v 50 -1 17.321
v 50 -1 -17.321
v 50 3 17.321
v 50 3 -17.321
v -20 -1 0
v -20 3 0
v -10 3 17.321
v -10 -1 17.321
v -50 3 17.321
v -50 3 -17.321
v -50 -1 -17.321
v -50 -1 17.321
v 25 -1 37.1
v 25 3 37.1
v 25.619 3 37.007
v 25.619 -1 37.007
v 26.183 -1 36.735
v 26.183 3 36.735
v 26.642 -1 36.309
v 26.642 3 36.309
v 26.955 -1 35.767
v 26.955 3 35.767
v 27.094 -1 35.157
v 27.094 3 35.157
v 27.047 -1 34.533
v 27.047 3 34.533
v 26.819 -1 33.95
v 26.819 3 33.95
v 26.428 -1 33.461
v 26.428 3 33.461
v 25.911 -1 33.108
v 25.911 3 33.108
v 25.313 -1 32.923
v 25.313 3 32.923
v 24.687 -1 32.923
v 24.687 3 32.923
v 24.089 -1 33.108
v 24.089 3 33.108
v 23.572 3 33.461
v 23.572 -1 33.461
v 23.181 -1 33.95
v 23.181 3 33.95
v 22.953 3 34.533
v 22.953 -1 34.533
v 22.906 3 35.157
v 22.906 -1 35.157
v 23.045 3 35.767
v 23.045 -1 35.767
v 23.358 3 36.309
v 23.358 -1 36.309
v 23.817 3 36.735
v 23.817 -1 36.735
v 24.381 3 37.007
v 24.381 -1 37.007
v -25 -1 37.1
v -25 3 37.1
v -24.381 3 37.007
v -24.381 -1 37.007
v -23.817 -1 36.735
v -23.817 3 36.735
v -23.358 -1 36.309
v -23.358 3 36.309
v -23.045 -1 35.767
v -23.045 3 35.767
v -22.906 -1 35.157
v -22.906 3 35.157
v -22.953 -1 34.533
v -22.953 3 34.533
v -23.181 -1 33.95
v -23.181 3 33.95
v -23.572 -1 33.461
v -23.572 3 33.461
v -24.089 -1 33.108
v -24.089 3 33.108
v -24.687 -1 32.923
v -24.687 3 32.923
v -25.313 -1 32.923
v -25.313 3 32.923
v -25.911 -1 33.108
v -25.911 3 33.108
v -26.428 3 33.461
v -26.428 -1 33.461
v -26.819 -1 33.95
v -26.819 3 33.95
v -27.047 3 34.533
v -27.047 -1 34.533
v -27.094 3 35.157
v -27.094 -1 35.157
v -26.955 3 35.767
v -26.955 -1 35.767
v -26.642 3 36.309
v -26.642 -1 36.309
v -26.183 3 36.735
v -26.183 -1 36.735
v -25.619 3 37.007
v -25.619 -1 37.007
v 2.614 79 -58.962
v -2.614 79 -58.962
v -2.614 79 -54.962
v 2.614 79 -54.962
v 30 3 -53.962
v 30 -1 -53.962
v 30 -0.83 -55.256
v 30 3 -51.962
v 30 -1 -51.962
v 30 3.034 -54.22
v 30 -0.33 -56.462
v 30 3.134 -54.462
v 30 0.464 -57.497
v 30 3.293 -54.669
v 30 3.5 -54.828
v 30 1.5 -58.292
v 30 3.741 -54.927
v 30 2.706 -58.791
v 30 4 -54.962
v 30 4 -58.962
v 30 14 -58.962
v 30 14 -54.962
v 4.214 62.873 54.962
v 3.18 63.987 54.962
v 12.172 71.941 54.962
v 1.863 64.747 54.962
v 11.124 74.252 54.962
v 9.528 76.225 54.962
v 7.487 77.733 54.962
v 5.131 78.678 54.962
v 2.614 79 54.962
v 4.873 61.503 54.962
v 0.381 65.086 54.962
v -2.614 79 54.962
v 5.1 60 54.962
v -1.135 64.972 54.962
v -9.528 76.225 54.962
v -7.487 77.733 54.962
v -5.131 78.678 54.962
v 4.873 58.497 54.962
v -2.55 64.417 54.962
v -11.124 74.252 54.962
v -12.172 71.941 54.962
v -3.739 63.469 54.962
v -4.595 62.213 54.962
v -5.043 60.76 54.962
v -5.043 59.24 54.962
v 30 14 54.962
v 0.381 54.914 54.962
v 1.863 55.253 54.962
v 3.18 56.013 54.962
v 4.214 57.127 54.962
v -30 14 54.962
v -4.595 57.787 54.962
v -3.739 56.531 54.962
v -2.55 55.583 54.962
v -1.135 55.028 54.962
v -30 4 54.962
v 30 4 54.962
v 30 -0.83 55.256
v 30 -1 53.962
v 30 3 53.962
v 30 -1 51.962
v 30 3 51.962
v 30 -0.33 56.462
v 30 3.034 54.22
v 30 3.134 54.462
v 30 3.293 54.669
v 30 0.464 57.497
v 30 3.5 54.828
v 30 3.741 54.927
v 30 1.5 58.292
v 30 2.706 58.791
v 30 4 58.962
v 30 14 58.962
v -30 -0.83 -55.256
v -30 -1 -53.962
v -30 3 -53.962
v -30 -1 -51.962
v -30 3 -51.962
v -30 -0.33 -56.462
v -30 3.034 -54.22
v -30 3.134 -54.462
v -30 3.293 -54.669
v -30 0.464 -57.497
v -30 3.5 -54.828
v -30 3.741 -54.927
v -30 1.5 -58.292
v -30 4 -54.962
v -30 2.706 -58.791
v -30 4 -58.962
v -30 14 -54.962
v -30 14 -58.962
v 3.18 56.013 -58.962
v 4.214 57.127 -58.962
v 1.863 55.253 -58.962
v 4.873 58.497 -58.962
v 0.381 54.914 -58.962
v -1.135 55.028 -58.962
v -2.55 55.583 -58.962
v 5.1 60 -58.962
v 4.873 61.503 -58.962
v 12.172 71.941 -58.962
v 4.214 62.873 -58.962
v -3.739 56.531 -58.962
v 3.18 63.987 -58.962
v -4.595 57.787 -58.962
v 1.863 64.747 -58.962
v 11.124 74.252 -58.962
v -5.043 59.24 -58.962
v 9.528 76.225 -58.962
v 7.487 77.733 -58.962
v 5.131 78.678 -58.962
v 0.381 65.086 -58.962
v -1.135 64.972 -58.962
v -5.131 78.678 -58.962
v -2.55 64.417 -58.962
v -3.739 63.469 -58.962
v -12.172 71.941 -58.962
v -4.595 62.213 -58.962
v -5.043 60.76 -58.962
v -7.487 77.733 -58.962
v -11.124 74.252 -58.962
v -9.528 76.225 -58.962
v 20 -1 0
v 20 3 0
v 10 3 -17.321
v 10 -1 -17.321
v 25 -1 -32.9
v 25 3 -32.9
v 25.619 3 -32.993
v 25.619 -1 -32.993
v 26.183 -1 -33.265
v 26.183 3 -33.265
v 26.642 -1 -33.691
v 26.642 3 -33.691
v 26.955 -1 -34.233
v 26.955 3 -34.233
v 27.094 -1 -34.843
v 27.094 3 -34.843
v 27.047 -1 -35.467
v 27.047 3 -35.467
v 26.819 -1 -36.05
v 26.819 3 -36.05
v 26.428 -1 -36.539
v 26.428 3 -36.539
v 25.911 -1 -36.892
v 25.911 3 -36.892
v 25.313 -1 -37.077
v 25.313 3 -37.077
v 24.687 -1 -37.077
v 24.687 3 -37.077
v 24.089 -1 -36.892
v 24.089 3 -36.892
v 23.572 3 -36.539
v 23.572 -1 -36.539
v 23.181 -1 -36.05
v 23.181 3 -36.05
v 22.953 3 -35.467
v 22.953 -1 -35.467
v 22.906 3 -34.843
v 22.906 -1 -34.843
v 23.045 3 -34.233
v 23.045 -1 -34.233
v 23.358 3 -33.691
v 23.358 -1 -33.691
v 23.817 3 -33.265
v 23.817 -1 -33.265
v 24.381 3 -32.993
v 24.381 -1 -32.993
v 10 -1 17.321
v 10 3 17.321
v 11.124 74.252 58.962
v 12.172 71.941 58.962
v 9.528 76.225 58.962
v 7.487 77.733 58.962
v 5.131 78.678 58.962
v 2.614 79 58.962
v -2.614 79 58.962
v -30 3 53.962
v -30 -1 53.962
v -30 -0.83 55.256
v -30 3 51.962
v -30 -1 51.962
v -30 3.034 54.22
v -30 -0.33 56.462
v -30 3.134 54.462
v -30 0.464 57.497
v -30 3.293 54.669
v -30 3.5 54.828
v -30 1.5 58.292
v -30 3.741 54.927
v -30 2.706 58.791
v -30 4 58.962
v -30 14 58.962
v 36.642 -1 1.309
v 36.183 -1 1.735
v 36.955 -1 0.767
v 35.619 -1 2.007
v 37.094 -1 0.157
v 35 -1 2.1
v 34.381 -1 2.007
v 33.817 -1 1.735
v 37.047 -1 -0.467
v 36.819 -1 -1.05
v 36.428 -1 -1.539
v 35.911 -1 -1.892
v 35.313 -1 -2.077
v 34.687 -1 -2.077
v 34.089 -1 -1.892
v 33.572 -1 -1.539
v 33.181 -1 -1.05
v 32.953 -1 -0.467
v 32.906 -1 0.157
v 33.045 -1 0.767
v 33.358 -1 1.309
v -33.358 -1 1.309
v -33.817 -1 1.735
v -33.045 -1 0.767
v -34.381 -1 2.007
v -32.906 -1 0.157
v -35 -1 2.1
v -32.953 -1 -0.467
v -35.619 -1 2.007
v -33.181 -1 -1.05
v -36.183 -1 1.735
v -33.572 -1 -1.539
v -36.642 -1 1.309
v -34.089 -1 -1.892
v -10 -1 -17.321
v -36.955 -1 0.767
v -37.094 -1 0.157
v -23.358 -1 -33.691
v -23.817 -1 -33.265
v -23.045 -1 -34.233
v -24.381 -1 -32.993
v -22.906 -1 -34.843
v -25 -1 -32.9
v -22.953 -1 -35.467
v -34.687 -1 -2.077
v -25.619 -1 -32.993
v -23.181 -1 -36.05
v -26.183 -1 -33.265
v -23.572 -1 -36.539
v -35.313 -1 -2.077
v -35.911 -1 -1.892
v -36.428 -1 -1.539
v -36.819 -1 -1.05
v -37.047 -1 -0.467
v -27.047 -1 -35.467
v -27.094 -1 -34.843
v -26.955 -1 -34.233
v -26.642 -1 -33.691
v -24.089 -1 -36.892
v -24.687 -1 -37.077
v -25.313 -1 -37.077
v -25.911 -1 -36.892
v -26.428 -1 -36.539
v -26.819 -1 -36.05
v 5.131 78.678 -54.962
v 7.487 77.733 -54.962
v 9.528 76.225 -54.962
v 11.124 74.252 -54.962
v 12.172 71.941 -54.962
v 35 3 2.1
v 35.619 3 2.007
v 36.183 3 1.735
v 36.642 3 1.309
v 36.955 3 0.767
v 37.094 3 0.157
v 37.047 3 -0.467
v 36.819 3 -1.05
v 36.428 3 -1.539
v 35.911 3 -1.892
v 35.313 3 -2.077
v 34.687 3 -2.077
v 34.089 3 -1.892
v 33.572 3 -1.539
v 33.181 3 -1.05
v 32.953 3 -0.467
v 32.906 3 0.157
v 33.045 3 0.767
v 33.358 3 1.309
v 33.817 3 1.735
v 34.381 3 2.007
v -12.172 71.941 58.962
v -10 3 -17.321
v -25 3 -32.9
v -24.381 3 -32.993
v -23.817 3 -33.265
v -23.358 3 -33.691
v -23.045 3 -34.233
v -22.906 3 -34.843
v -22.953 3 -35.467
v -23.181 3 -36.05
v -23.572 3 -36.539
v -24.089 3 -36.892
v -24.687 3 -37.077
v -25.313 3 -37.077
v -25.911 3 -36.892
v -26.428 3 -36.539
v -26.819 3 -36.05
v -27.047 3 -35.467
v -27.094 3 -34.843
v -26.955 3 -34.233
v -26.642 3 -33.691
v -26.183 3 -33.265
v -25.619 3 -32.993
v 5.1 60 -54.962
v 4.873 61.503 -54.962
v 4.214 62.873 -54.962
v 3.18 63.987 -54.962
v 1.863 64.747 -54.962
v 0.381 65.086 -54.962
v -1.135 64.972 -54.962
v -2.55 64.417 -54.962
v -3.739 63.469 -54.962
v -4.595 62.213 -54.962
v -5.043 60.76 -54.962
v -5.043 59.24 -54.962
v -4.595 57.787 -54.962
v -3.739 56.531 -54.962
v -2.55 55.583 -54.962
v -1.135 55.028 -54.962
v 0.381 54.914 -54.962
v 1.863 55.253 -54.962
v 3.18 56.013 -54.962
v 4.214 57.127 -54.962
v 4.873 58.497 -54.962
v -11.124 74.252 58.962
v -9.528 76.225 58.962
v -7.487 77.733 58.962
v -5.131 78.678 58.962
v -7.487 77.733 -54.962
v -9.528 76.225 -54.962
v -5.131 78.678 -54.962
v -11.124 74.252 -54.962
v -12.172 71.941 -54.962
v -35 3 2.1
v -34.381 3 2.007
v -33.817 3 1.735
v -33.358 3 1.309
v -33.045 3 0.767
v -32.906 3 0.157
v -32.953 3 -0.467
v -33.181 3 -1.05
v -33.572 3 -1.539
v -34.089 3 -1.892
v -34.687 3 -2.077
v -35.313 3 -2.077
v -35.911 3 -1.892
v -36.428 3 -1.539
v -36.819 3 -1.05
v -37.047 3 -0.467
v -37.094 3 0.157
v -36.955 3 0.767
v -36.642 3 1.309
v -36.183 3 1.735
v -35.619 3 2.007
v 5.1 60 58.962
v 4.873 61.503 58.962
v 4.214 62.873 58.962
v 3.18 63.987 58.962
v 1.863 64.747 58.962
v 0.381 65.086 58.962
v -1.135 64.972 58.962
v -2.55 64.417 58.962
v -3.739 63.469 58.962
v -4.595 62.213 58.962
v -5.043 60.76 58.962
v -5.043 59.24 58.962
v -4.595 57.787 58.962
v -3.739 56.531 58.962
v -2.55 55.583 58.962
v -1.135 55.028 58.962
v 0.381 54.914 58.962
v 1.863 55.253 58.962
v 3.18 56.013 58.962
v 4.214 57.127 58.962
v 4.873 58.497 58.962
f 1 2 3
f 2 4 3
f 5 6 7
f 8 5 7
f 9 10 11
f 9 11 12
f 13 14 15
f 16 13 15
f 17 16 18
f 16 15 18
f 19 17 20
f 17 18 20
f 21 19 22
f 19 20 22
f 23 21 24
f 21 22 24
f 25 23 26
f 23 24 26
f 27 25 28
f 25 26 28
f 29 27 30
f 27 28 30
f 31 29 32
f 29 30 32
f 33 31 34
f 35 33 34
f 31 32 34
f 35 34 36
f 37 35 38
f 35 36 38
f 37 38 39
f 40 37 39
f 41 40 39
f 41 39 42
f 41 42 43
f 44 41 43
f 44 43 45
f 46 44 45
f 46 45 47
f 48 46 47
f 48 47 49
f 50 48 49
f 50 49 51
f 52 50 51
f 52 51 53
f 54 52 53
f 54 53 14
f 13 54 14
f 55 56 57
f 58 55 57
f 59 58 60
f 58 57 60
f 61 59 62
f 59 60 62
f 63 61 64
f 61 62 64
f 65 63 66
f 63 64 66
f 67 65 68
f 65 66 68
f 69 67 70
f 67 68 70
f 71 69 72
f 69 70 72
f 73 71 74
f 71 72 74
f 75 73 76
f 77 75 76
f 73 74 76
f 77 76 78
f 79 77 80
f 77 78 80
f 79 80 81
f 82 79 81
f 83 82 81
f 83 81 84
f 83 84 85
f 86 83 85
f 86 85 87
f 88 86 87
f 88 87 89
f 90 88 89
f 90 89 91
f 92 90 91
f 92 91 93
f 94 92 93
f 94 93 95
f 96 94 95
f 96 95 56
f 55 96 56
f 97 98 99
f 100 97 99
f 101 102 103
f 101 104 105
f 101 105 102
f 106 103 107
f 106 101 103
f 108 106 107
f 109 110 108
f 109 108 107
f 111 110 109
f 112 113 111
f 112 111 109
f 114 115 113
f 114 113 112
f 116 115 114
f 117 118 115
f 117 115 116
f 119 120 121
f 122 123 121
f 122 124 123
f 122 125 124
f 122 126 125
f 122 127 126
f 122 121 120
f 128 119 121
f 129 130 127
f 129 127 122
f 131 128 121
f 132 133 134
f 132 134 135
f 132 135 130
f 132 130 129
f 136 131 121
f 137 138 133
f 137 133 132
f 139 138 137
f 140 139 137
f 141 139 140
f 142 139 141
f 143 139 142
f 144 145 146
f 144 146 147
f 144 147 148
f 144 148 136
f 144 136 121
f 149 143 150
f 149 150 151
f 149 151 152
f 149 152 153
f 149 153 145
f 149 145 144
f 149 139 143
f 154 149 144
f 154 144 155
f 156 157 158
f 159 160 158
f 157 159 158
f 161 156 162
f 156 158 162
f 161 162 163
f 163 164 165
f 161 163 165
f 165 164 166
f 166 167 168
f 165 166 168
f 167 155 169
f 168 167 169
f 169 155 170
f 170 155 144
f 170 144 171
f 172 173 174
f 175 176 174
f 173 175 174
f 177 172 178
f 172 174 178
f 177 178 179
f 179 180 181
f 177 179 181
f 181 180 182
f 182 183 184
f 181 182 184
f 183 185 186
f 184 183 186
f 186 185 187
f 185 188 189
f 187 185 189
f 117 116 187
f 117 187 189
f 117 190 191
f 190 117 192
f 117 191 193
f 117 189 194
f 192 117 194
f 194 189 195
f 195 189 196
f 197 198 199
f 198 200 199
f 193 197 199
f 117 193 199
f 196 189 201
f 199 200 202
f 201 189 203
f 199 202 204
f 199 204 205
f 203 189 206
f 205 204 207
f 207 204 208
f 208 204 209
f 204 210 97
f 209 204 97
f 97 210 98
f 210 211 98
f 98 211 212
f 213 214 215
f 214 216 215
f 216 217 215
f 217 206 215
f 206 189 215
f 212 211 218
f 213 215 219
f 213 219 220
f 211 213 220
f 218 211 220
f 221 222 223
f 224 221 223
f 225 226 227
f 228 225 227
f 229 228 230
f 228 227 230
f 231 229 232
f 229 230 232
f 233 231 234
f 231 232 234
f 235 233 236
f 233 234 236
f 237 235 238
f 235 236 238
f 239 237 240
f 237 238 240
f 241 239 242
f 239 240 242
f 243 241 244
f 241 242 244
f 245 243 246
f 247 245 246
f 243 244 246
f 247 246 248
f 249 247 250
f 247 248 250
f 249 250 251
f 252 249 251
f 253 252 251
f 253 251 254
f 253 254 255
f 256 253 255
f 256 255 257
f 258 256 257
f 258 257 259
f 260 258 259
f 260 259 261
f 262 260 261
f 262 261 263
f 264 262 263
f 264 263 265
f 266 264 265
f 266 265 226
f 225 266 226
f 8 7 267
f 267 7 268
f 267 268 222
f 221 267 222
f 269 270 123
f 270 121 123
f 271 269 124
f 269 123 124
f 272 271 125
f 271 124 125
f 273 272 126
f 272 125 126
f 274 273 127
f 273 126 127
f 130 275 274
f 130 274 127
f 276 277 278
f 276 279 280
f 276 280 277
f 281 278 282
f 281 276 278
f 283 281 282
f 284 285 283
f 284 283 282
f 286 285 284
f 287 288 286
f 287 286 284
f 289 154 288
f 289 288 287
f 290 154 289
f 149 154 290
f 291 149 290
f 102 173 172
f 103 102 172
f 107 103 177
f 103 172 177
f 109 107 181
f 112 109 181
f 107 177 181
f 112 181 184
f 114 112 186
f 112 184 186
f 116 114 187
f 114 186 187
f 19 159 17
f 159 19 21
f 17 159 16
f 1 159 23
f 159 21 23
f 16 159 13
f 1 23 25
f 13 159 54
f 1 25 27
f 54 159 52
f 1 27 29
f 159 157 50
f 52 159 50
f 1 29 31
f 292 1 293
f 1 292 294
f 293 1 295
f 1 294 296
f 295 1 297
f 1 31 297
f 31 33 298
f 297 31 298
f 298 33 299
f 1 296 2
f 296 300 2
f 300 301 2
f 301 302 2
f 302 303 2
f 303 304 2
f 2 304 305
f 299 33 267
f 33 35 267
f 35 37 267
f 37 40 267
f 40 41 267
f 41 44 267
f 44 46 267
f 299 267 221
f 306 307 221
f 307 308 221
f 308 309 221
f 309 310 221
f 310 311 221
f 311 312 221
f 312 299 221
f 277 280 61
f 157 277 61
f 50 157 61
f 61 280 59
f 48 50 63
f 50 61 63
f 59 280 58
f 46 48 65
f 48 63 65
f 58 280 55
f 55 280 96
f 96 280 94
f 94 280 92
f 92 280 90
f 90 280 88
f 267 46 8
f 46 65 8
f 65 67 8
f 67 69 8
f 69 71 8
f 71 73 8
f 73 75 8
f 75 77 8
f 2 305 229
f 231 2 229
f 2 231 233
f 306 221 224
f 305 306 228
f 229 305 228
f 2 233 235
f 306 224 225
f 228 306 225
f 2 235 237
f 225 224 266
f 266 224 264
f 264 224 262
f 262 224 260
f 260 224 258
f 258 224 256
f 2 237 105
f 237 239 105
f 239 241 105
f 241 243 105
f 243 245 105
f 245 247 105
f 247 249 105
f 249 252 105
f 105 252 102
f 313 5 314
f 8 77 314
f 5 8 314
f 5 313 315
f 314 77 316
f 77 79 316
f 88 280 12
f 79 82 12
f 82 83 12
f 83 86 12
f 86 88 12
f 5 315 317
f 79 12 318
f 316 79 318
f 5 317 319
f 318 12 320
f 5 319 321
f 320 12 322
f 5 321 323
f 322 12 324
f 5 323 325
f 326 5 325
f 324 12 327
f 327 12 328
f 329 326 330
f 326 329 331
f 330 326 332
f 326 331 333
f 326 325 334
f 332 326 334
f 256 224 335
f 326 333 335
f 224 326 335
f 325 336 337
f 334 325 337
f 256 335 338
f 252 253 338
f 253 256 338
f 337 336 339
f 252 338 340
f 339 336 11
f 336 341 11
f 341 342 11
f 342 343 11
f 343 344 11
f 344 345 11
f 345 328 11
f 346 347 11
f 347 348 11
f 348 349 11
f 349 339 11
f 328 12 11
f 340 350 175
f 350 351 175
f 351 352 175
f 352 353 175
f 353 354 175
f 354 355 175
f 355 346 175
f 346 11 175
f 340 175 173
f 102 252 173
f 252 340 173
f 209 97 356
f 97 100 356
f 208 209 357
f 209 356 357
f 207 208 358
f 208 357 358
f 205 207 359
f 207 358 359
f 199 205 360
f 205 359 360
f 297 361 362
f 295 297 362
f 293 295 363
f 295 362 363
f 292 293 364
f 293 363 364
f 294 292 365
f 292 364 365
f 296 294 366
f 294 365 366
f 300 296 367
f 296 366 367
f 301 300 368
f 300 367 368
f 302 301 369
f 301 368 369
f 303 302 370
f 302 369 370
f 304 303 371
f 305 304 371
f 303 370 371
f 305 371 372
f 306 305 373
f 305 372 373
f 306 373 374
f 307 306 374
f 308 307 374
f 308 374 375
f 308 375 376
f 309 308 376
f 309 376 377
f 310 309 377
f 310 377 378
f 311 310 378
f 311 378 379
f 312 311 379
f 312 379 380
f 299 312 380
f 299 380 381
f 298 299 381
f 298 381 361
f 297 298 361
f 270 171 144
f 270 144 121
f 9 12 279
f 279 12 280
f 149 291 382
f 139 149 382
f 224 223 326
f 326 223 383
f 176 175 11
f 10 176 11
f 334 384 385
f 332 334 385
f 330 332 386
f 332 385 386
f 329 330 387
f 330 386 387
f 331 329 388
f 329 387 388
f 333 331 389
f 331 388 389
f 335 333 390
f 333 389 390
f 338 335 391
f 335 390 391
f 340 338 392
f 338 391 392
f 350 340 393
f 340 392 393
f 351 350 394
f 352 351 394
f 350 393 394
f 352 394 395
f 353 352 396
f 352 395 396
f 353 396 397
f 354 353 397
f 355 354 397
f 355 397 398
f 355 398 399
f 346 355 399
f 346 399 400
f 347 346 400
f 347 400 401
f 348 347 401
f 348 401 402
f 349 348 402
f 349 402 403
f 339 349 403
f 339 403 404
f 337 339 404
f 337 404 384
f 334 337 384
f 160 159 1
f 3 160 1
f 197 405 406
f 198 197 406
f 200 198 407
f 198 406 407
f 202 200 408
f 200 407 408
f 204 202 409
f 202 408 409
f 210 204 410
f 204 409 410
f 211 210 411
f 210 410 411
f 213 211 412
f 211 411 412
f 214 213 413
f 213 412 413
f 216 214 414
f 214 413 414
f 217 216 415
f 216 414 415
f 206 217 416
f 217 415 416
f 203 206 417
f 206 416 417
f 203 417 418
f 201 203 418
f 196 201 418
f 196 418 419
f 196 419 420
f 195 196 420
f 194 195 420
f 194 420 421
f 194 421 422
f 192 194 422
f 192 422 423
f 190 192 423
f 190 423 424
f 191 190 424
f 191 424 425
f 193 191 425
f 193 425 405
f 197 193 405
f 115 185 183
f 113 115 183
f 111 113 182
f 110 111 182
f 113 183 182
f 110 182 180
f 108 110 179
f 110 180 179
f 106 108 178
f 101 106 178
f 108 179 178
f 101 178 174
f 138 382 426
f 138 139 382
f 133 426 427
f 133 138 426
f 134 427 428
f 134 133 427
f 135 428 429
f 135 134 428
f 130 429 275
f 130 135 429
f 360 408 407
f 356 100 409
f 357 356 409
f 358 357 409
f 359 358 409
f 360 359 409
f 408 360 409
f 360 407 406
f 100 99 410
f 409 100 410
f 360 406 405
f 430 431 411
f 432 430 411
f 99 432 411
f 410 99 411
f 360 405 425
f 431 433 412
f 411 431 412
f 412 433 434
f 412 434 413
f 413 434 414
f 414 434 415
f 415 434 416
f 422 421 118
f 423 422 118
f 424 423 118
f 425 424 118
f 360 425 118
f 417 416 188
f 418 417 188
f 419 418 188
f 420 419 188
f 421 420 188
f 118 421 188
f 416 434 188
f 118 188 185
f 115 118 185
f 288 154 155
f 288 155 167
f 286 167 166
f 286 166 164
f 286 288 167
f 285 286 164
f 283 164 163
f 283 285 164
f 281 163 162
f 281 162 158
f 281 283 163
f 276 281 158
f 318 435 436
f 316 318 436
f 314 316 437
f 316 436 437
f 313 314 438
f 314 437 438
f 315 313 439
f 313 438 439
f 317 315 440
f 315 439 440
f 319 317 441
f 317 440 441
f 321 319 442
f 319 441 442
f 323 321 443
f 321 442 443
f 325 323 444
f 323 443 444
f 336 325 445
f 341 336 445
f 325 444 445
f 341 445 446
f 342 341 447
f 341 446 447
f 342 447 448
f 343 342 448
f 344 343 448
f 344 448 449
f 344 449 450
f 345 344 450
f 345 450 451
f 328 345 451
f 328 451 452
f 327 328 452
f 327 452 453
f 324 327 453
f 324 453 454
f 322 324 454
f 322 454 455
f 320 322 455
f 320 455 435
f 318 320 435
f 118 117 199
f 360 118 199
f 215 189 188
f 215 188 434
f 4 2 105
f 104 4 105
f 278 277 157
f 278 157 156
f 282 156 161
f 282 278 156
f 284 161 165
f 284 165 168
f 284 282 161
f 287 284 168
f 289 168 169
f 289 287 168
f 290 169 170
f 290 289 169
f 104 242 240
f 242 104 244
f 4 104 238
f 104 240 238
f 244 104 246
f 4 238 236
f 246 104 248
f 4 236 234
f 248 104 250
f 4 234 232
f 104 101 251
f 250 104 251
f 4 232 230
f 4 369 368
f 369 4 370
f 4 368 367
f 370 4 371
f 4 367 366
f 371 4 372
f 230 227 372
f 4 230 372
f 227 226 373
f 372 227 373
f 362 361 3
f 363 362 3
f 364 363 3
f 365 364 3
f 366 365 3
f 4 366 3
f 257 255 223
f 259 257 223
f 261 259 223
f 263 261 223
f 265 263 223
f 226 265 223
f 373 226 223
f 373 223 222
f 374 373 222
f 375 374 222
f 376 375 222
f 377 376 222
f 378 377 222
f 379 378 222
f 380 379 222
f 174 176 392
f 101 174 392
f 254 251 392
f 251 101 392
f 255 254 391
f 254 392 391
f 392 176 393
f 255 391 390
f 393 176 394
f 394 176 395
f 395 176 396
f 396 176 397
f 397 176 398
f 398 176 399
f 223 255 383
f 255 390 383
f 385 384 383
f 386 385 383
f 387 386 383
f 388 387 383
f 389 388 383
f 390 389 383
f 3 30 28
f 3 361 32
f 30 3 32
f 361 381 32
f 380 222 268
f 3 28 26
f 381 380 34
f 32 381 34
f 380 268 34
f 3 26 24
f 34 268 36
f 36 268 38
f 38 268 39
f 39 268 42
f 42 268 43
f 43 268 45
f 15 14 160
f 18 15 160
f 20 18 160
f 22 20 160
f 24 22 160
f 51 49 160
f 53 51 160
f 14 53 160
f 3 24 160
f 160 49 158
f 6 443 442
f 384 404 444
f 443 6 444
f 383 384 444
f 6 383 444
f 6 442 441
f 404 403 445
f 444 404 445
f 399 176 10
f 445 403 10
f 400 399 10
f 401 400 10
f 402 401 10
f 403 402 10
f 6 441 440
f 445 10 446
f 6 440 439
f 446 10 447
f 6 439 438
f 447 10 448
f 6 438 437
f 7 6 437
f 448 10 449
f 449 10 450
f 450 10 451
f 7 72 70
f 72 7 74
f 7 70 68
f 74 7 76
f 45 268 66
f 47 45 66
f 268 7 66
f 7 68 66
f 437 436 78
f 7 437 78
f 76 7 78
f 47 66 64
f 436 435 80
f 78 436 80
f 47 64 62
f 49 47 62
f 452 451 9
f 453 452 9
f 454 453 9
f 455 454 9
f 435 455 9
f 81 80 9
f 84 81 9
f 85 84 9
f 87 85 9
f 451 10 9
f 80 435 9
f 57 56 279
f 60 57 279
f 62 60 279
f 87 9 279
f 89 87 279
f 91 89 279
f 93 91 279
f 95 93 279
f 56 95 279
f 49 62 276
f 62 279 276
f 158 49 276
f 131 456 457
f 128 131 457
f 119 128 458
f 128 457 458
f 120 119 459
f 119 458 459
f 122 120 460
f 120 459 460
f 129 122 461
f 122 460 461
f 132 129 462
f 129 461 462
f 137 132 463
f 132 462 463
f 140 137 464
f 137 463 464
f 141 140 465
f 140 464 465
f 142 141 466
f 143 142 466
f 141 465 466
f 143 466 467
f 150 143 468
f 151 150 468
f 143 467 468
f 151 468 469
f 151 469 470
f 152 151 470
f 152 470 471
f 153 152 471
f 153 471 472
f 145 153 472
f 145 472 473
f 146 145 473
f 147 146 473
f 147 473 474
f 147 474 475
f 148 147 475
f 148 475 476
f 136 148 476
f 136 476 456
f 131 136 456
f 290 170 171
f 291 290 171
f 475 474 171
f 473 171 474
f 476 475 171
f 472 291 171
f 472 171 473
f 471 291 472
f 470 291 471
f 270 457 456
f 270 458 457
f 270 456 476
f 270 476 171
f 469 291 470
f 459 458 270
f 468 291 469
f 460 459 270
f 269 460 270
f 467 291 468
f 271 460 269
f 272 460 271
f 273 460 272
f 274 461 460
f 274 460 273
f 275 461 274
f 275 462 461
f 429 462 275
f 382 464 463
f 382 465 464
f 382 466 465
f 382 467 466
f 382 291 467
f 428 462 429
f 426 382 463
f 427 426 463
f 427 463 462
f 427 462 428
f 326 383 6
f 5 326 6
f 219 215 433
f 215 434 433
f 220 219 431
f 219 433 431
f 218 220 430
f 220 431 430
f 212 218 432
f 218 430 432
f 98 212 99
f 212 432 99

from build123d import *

# Parameters (mm, degrees)
EXTRUDE_1_DEPTH        = 3
SHEET_START            = -1
SHEET_METAL_1_DEPTH    = 1
SM_EDGE_FLANGE_1_DEPTH = 60
CUT_EXTRUDE_1_DEPTH    = 149.811702088
CUT_EXTRUDE_2_DEPTH    = 114.368696469
CUT_EXTRUDE_4_DEPTH    = 114.368696469
MIRROR_6_COPY_1_DEPTH  = 149.811702088
SKETCH_13_R            = 5.1
CUT_EXTRUDE_5_DEPTH    = 155.10011472
FILLET_1_R             = 10
CUT_EXTRUDE_6_REACH    = 110.409
SKETCH_15_R            = 2.1


# Read off the part's stored shape, not the designer's step: 轉換-實體1
# Sheet-metal steps are written as plain solids
with BuildPart() as part:
    # Sketch 1 → 填料-伸長1 (new body)
    with BuildSketch(Plane(origin=(0, 0, 0), x_dir=(1, 0, 0), z_dir=(0, 1, 0))):
        Polygon((30, 51.961524227), (-30, 51.961524227), (-60, 0), (-30, -51.961524227), (30, -51.961524227), (60, 0), align=None)
    extrude(amount=EXTRUDE_1_DEPTH)

    # Sheet Metal 1 outline → Sheet Metal 1 (add)
    with BuildSketch(Plane(origin=(0, 0, 0), x_dir=(1, 0, 0), z_dir=(0, 1, 0)).offset(SHEET_START)):
        Polygon((-30, 51.961524227), (-60, 0), (-30, -51.961524227), (30, -51.961524227), (60, 0), (30, 51.961524227), align=None)
    extrude(amount=SHEET_METAL_1_DEPTH)

    # 邊線-凸緣1 section (across the edge) → 邊線-凸緣1 (add)
    with BuildSketch(Plane(origin=(-30, 3, 54.961524227), x_dir=(0, 0, -1), z_dir=(1, 0, 0))):
        with BuildLine():
            Line((-4, 1), (-4, 76))
            Line((-4, 76), (0, 76))
            Line((0, 76), (0, 1))
            ThreePointArc((0, 1), (0.292893219, 0.292893219), (1, 0))
            Line((1, 0), (3, 0))
            Line((3, 0), (3, -4))
            Line((3, -4), (1, -4))
            ThreePointArc((1, -4), (-2.535533906, -2.535533906), (-4, 1))
        make_face()
    sm_edge_flange_1 = extrude(amount=SM_EDGE_FLANGE_1_DEPTH)

    # 草圖9 → 除料-伸長1 (cut, symmetric)
    with BuildSketch(Plane.XY.offset(58.961524227)):
        Polygon((-30, 79), (-30, 14), (-10, 79), align=None)
    cut_extrude_1 = extrude(amount=CUT_EXTRUDE_1_DEPTH, both=True, mode=Mode.SUBTRACT)

    # 草圖10 → 除料-伸長2 (cut, through all)
    with BuildSketch(Plane(origin=(0, 3, 0), x_dir=(1, 0, 0), z_dir=(0, 1, 0))):
        Polygon((10, 17.320508076), (-10, 17.320508076), (-20, 0), (-10, -17.320508076), (10, -17.320508076), (20, 0), align=None)
    extrude(amount=-CUT_EXTRUDE_2_DEPTH, mode=Mode.SUBTRACT)

    # 草圖12 → 除料-伸長4 (cut, symmetric)
    with BuildSketch(Plane(origin=(0, 3, 0), x_dir=(1, 0, 0), z_dir=(0, 1, 0))):
        Polygon((50, 295.043861202), (50, 17.320508076), (50, -17.320508076), (50, -295.043861202), (605.446706252, -295.043861202), (605.446706252, 295.043861202), align=None)
    cut_extrude_4 = extrude(amount=CUT_EXTRUDE_4_DEPTH, both=True, mode=Mode.SUBTRACT)

    # 鏡射1: 除料-伸長1 across plane
    add(cut_extrude_1.mirror(Plane(origin=(0, 0, 0), x_dir=(0, 0, 1), z_dir=(1, 0, 0))), mode=Mode.SUBTRACT)

    # 鏡射6: 邊線-凸緣1, 除料-伸長1 across plane
    add(sm_edge_flange_1.mirror(Plane.XY))
    add(cut_extrude_1.mirror(Plane.XY), mode=Mode.SUBTRACT)

    # 鏡射6 copy 1 sketch → 鏡射6 copy 1 (cut, symmetric)
    with BuildSketch(Plane(origin=(0, 0, -58.961524227), x_dir=(-1, 0, 0), z_dir=(0, 0, -1))):
        Polygon((-30, 79), (-30, 14), (-10, 79), align=None)
    extrude(amount=MIRROR_6_COPY_1_DEPTH, both=True, mode=Mode.SUBTRACT)

    # 草圖13 → 除料-伸長5 (cut, through all)
    with BuildSketch(Plane.XY.offset(58.961524227)):
        with Locations((0, 60)):
            Circle(SKETCH_13_R)
    extrude(amount=-CUT_EXTRUDE_5_DEPTH, mode=Mode.SUBTRACT)

    # 圓角1
    fillet_1_edges = [part.edges().sort_by_distance(p)[0] for p in [
        (10, 79, 56.961524227),
        (10, 79, -56.961524227),
        (-10, 79, -56.961524227),
        (-10, 79, 56.961524227),
    ]]
    fillet(fillet_1_edges, radius=FILLET_1_R)

    # 鏡射7: 除料-伸長4 across plane
    add(cut_extrude_4.mirror(Plane(origin=(0, 0, 0), x_dir=(0, 0, 1), z_dir=(1, 0, 0))), mode=Mode.SUBTRACT)

    # 草圖15 → 除料-伸長6 (cut, up to next)
    with BuildSketch(Plane(origin=(0, 3, 0), x_dir=(1, 0, 0), z_dir=(0, 1, 0)), mode=Mode.PRIVATE) as cut_extrude_6_sk1:
        with Locations(Location((-35, 0, 0), (0, 0, 270))):
            Circle(SKETCH_15_R)
    cut_extrude_6_tool1 = extrude(cut_extrude_6_sk1.sketch, amount=-CUT_EXTRUDE_6_REACH, mode=Mode.PRIVATE) & part.part
    # 草圖15 → 除料-伸長6 (cut, up to next)
    with BuildSketch(Plane(origin=(0, 3, 0), x_dir=(1, 0, 0), z_dir=(0, 1, 0)), mode=Mode.PRIVATE) as cut_extrude_6_sk2:
        with Locations(Location((-25, 35, 0), (0, 0, 270))):
            Circle(SKETCH_15_R)
    cut_extrude_6_tool2 = extrude(cut_extrude_6_sk2.sketch, amount=-CUT_EXTRUDE_6_REACH, mode=Mode.PRIVATE) & part.part
    # 草圖15 → 除料-伸長6 (cut, up to next)
    with BuildSketch(Plane(origin=(0, 3, 0), x_dir=(1, 0, 0), z_dir=(0, 1, 0)), mode=Mode.PRIVATE) as cut_extrude_6_sk3:
        with Locations(Location((25, 35, 0), (0, 0, 270))):
            Circle(SKETCH_15_R)
    cut_extrude_6_tool3 = extrude(cut_extrude_6_sk3.sketch, amount=-CUT_EXTRUDE_6_REACH, mode=Mode.PRIVATE) & part.part
    # 草圖15 → 除料-伸長6 (cut, up to next)
    with BuildSketch(Plane(origin=(0, 3, 0), x_dir=(1, 0, 0), z_dir=(0, 1, 0)), mode=Mode.PRIVATE) as cut_extrude_6_sk4:
        with Locations(Location((25, -35, 0), (0, 0, 270))):
            Circle(SKETCH_15_R)
    cut_extrude_6_tool4 = extrude(cut_extrude_6_sk4.sketch, amount=-CUT_EXTRUDE_6_REACH, mode=Mode.PRIVATE) & part.part
    # 草圖15 → 除料-伸長6 (cut, up to next)
    with BuildSketch(Plane(origin=(0, 3, 0), x_dir=(1, 0, 0), z_dir=(0, 1, 0)), mode=Mode.PRIVATE) as cut_extrude_6_sk5:
        with Locations(Location((-25, -35, 0), (0, 0, 270))):
            Circle(SKETCH_15_R)
    cut_extrude_6_tool5 = extrude(cut_extrude_6_sk5.sketch, amount=-CUT_EXTRUDE_6_REACH, mode=Mode.PRIVATE) & part.part
    # 草圖15 → 除料-伸長6 (cut, up to next)
    with BuildSketch(Plane(origin=(0, 3, 0), x_dir=(1, 0, 0), z_dir=(0, 1, 0)), mode=Mode.PRIVATE) as cut_extrude_6_sk6:
        with Locations(Location((35, 0, 0), (0, 0, 270))):
            Circle(SKETCH_15_R)
    cut_extrude_6_tool6 = extrude(cut_extrude_6_sk6.sketch, amount=-CUT_EXTRUDE_6_REACH, mode=Mode.PRIVATE) & part.part
    add(cut_extrude_6_tool1.solids().sort_by_distance((-35, 3, 0))[0], mode=Mode.SUBTRACT)
    add(cut_extrude_6_tool2.solids().sort_by_distance((-25, 3, -35))[0], mode=Mode.SUBTRACT)
    add(cut_extrude_6_tool3.solids().sort_by_distance((25, 3, -35))[0], mode=Mode.SUBTRACT)
    add(cut_extrude_6_tool4.solids().sort_by_distance((25, 3, 35))[0], mode=Mode.SUBTRACT)
    add(cut_extrude_6_tool5.solids().sort_by_distance((-25, 3, 35))[0], mode=Mode.SUBTRACT)
    add(cut_extrude_6_tool6.solids().sort_by_distance((35, 3, 0))[0], mode=Mode.SUBTRACT)


solid = part.part
